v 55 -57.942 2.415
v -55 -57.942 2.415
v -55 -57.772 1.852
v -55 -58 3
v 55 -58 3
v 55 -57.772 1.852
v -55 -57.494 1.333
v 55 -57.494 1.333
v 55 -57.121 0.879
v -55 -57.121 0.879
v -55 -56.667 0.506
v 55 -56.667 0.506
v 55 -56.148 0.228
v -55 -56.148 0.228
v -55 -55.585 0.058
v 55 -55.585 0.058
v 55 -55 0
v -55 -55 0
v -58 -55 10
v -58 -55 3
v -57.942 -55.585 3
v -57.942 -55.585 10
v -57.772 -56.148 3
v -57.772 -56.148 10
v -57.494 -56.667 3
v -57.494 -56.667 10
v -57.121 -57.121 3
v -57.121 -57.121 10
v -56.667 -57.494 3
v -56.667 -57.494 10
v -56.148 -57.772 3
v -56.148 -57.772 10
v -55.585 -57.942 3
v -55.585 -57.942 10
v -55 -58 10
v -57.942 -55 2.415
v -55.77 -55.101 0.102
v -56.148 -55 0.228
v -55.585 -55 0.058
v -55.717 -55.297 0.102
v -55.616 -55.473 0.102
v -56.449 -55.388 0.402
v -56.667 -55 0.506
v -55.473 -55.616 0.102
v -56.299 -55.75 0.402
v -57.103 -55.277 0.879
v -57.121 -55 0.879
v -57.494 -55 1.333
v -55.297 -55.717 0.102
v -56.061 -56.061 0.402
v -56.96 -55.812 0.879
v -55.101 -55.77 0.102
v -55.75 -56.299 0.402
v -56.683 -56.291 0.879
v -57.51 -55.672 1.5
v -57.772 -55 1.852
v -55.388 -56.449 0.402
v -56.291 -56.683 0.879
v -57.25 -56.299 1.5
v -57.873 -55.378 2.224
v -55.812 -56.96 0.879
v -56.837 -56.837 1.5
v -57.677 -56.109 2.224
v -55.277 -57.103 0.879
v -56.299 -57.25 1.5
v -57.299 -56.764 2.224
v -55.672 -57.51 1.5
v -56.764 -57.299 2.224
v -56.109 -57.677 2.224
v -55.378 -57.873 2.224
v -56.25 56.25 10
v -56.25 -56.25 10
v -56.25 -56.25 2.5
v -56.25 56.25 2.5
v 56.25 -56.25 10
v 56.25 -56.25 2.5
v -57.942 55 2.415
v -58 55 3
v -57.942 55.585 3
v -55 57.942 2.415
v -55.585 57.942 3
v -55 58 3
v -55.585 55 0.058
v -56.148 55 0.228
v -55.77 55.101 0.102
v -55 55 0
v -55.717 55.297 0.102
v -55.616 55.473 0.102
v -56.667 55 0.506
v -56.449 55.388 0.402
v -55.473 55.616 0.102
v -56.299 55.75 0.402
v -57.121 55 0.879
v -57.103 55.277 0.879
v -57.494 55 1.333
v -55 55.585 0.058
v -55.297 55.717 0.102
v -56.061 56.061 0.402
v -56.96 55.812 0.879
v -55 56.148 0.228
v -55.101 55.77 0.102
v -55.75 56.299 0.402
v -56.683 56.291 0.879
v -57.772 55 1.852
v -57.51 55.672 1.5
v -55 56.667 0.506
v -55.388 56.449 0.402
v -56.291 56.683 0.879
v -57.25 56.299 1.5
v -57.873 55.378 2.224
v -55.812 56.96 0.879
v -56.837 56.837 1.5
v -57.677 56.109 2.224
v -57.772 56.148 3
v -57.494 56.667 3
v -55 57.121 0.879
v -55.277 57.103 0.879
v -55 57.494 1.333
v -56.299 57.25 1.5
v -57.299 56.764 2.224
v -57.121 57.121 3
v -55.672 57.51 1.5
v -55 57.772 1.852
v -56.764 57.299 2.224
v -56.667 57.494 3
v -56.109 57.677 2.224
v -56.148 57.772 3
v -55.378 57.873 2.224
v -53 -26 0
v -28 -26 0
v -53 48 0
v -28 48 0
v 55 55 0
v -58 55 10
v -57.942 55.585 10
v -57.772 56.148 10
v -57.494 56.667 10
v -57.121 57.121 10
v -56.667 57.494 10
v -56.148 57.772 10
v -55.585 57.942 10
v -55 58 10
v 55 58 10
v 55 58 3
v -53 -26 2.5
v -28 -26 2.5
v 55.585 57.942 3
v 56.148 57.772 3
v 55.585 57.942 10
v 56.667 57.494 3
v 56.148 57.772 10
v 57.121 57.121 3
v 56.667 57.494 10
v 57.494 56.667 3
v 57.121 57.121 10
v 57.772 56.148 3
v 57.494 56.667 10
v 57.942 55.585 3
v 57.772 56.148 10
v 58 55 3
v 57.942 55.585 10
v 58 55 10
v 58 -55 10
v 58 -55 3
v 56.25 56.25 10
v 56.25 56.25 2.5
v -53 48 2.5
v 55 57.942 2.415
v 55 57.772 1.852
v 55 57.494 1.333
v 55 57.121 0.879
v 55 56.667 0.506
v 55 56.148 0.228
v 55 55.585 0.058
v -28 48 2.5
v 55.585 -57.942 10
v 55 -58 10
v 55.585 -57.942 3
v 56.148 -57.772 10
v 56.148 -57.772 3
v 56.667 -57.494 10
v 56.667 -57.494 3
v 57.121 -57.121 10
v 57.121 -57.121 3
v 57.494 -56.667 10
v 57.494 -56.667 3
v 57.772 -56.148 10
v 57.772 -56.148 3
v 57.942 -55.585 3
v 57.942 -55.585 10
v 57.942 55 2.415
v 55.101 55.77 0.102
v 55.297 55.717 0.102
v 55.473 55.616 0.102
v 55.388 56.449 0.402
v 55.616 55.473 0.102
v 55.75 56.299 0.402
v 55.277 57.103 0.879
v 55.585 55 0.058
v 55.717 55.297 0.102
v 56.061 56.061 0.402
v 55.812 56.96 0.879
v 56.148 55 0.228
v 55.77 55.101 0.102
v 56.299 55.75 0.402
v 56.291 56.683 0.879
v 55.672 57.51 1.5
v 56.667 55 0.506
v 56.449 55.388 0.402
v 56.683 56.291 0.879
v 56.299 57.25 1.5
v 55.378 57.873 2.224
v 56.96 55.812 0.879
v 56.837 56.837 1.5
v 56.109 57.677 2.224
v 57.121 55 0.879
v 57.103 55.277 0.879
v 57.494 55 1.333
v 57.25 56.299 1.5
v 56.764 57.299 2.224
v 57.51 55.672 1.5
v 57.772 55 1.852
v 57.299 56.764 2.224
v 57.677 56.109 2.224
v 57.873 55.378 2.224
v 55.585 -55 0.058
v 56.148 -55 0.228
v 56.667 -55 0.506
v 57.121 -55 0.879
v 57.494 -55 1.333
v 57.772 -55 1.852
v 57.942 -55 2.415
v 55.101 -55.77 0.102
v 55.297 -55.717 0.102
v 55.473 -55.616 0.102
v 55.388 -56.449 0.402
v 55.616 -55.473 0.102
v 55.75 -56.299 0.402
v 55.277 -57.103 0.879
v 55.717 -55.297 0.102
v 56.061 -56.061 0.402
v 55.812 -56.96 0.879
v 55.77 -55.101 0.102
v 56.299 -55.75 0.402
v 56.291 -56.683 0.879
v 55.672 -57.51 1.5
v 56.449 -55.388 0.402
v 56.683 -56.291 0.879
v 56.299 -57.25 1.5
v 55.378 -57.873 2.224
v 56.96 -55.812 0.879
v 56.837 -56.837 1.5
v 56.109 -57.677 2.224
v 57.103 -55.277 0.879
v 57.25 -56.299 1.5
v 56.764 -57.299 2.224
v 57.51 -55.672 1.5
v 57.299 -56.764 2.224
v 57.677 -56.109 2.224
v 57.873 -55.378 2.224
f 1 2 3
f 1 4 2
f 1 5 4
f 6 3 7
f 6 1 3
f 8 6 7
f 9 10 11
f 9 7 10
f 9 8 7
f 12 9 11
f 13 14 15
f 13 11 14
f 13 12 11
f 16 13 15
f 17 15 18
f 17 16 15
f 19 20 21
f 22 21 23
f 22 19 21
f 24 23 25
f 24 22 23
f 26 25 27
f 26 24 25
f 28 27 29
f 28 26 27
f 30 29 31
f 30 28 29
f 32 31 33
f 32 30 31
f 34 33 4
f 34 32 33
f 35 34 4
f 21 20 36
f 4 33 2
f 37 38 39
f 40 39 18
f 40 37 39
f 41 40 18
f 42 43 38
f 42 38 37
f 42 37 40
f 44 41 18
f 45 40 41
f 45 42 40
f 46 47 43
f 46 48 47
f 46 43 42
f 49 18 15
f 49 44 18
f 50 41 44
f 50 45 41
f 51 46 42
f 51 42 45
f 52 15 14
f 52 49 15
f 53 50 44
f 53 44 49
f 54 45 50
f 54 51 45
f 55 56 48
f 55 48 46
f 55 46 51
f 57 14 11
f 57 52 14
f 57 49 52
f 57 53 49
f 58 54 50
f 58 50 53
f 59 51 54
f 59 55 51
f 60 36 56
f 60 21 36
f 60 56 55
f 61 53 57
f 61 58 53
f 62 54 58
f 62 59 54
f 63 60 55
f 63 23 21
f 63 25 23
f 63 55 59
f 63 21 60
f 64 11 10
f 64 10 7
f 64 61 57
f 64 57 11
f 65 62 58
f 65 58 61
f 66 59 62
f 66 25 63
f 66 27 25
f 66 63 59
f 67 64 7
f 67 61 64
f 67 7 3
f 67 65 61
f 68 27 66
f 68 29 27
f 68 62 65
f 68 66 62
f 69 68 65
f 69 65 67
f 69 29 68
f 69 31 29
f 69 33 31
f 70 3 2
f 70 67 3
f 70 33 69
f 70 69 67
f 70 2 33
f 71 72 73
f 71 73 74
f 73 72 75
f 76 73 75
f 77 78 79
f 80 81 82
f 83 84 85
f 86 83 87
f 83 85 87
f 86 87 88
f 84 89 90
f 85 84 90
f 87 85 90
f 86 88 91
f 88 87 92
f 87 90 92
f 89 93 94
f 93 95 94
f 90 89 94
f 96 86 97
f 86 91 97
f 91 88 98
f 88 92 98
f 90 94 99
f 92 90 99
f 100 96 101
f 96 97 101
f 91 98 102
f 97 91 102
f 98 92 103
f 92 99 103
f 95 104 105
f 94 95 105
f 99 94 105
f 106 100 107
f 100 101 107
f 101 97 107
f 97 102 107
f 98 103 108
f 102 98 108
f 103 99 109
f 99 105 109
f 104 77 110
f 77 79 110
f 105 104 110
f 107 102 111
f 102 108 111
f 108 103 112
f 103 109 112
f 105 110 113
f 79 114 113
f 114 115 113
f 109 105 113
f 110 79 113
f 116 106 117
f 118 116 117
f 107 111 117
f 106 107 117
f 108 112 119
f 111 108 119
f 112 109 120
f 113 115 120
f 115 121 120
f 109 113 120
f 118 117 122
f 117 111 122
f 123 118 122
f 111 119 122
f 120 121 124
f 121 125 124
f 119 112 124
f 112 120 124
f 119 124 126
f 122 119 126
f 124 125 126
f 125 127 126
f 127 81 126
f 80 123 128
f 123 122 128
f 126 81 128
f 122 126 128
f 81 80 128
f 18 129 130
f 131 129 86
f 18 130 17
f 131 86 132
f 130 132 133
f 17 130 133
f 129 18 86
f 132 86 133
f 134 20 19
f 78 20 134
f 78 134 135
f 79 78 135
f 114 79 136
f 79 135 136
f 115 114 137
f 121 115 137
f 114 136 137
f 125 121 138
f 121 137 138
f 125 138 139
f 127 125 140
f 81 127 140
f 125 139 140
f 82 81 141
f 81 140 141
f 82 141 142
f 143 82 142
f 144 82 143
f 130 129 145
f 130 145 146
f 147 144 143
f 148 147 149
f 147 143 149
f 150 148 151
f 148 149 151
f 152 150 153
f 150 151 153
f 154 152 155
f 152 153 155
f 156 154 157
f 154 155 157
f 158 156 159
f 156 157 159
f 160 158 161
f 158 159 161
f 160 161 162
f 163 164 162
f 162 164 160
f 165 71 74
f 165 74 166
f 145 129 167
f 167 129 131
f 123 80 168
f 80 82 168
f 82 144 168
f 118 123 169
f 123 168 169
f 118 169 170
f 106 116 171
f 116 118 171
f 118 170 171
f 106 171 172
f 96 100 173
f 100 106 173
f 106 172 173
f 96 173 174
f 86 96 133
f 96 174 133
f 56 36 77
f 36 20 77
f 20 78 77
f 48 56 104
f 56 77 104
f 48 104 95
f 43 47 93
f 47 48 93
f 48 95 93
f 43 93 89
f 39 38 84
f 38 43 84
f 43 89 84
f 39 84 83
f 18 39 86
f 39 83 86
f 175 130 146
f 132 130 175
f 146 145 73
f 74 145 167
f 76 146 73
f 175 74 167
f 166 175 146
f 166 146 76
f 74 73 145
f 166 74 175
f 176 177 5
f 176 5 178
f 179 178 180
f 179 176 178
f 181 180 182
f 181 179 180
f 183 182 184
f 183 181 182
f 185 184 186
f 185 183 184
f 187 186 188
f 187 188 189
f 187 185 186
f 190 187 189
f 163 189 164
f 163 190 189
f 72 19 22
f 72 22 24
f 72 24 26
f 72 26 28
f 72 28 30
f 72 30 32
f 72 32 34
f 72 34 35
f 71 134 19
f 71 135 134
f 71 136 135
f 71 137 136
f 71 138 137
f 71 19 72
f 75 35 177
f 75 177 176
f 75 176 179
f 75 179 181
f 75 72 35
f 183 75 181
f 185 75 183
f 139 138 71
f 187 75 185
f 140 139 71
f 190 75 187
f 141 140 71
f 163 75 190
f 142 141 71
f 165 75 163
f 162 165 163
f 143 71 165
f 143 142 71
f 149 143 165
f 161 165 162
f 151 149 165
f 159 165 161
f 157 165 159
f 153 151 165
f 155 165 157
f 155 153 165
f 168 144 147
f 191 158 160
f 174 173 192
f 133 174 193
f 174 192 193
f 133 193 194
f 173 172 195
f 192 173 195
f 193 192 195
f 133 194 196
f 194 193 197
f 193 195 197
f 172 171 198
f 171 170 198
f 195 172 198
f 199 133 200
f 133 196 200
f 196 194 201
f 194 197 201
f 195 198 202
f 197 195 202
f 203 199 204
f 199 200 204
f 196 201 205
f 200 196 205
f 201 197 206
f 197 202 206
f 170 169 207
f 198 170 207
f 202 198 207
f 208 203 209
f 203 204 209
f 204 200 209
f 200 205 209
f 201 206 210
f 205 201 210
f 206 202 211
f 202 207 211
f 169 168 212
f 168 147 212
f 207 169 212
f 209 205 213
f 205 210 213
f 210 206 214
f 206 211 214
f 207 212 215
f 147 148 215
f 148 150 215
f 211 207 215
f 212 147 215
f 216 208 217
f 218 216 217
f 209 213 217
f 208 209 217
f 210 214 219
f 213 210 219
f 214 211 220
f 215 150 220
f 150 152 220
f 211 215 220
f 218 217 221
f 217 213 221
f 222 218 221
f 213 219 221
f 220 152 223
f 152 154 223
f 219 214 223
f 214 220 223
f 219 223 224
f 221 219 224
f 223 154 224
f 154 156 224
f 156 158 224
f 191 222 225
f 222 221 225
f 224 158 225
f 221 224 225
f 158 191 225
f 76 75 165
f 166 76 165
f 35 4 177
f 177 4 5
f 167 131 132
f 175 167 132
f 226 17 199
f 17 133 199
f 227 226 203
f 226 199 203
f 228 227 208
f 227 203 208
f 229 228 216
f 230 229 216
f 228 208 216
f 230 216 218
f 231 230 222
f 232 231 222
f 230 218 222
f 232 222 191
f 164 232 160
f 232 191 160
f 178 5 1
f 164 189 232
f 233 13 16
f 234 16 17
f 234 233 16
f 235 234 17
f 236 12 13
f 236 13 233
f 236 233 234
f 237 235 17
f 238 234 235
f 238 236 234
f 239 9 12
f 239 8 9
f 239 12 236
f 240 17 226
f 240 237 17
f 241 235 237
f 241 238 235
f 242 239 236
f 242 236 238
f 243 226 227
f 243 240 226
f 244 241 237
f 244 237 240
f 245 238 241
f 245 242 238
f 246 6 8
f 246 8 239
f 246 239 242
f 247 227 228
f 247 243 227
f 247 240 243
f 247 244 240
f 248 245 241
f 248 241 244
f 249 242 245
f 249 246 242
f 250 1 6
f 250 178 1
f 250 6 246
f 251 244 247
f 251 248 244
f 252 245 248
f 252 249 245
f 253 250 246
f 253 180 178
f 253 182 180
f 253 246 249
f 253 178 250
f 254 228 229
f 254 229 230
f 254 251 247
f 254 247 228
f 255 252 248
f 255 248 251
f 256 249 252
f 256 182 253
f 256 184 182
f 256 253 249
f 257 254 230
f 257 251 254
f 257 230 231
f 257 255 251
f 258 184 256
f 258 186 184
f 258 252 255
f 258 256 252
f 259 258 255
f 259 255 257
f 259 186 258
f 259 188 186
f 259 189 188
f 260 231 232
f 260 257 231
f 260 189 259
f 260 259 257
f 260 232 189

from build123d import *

# Parameters (mm, degrees)
F0_W     = 116
F0_H     = 116
F0_W_2   = 25
F0_H_2   = 74
F1_DEPTH = 10
F2_W     = 112.5
F2_H     = 112.5
F2_W_2   = 25
F2_H_2   = 74
F3_DEPTH = 7.5
F4_R     = 3


with BuildPart() as f1:
    # F0 (on Top) → F1 (new body)
    with BuildSketch(Plane.XY):
        Rectangle(F0_W, F0_H)
        with Locations((-40.5, 11)):
            Rectangle(F0_W_2, F0_H_2, mode=Mode.SUBTRACT)
    extrude(amount=F1_DEPTH)

    # F2 (on face) → F3 (cut)
    with BuildSketch(Plane.XY.offset(10)):
        Rectangle(F2_W, F2_H)
        with Locations((-40.5, 11)):
            Rectangle(F2_W_2, F2_H_2, mode=Mode.SUBTRACT)
    extrude(amount=-F3_DEPTH, mode=Mode.SUBTRACT)

    # F4
    f4_edges = [f1.edges().sort_by_distance(p)[0] for p in [
        (58, 58, 5),
        (58, -58, 5),
        (-58, 58, 5),
        (-58, -58, 5),
        (-58, 0, 0),
        (0, -58, 0),
        (0, 58, 0),
        (58, 0, 0),
    ]]
    fillet(f4_edges, radius=F4_R)


solid = f1.part
